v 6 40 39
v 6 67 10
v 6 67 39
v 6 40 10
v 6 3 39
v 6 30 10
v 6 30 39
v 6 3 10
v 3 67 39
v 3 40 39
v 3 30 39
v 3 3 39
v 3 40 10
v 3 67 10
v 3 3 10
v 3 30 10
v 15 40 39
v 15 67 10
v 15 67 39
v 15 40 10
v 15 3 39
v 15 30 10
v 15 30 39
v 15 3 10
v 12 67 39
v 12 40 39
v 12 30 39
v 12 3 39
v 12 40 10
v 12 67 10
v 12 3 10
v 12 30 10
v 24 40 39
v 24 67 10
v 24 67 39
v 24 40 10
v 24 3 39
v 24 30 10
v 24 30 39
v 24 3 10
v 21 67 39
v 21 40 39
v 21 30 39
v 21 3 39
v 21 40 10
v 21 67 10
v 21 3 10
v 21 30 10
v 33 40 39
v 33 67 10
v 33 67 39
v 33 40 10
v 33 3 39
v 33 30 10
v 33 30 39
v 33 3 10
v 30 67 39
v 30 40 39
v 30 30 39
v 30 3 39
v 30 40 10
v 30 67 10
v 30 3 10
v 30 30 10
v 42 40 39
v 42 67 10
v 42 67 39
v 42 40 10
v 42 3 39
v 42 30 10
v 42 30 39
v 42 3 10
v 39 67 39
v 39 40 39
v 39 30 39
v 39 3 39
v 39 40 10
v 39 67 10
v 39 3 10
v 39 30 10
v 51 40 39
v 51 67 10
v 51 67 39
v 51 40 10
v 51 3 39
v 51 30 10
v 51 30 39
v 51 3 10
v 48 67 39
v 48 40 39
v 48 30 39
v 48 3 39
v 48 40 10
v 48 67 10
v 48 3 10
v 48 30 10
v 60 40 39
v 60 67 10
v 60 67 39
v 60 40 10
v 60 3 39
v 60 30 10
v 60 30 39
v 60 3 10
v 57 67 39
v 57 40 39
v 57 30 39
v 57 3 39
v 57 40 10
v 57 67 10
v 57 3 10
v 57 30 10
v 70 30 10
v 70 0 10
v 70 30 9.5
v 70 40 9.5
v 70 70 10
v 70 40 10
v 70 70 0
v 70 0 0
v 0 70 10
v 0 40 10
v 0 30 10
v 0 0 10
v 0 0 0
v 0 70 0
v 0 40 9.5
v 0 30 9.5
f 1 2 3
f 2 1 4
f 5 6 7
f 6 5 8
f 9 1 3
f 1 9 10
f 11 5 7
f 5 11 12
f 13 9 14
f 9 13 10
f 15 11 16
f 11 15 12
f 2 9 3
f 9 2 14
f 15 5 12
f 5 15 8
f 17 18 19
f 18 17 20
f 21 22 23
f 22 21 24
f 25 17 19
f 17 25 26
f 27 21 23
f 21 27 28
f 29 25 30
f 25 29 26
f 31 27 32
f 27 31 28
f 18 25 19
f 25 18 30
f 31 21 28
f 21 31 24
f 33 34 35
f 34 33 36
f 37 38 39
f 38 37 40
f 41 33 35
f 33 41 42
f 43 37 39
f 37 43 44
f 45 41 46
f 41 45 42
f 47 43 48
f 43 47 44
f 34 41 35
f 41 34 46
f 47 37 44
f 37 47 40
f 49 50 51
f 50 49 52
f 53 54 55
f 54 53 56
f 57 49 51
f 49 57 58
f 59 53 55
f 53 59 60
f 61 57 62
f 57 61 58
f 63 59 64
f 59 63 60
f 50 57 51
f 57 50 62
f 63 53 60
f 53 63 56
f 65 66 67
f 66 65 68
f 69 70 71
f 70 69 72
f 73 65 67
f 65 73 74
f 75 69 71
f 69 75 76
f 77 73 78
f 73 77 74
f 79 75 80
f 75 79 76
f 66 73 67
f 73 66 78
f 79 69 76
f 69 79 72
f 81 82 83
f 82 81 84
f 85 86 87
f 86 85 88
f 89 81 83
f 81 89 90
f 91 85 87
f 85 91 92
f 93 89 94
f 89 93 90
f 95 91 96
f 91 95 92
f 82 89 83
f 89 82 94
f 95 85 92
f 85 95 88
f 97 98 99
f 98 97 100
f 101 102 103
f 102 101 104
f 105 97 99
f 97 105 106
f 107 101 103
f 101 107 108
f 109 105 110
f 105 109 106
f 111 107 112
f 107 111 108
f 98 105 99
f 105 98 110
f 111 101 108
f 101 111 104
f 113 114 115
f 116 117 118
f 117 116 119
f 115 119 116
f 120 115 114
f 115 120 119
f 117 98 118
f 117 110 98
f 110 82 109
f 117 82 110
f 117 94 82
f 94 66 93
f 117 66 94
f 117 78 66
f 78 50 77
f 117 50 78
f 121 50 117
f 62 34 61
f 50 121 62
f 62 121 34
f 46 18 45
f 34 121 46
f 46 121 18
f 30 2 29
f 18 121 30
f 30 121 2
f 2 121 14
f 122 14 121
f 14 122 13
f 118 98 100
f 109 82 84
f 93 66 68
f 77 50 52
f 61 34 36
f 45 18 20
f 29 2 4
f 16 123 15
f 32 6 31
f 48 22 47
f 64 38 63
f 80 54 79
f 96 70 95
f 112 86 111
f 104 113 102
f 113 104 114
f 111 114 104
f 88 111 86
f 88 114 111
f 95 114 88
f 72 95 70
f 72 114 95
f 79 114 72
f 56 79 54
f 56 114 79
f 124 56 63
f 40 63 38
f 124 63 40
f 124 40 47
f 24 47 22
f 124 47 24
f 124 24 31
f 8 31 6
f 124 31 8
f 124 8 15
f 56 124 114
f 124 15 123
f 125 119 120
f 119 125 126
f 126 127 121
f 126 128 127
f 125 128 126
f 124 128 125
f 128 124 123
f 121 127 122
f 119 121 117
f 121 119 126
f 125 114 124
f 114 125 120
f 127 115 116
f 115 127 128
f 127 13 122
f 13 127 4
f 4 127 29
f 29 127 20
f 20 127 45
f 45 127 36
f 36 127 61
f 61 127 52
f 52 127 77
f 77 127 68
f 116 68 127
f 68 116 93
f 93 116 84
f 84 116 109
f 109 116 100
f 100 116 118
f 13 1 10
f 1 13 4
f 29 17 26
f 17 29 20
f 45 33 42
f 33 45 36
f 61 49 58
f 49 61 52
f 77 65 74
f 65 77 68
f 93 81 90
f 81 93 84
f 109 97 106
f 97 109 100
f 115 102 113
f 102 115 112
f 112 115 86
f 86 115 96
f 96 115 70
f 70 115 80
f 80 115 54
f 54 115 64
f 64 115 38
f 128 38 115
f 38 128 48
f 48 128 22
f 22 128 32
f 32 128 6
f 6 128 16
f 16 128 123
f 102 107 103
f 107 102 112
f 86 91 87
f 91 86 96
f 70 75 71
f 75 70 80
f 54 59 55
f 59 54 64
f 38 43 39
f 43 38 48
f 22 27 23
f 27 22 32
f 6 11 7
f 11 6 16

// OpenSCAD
$fn = 32;

// ----------------------------------------------------------------------
// Heatsink: slotted fin block
// ----------------------------------------------------------------------

// --- parameters (mm) ---
base_l = 70;              // base length, X
base_w = 70;              // base width, Y
base_t = 10;              // base plate thickness
fin_h = 30;               // fin height above the base
fin_t = 3;                // fin thickness
edge = 3;                 // margin from the base ends
pitch = 9;                // fin pitch
slot_w = 10;              // central slot width, Y

n_fins = floor((base_l - 2 * edge - fin_t) / pitch) + 1;  // fin count
total_h = base_t + fin_h - 1;  // overall height

difference() {
union() {
  cube([base_l, base_w, base_t]);
  for (i = [0 : n_fins - 1])
    translate([edge + i * pitch, edge, base_t - 1])
      cube([fin_t, base_w - 2 * edge, fin_h]);
}
  translate([-1, base_w / 2 - slot_w / 2, base_t - 0.5])
    cube([base_l + 2, slot_w, fin_h + 2]);
}
